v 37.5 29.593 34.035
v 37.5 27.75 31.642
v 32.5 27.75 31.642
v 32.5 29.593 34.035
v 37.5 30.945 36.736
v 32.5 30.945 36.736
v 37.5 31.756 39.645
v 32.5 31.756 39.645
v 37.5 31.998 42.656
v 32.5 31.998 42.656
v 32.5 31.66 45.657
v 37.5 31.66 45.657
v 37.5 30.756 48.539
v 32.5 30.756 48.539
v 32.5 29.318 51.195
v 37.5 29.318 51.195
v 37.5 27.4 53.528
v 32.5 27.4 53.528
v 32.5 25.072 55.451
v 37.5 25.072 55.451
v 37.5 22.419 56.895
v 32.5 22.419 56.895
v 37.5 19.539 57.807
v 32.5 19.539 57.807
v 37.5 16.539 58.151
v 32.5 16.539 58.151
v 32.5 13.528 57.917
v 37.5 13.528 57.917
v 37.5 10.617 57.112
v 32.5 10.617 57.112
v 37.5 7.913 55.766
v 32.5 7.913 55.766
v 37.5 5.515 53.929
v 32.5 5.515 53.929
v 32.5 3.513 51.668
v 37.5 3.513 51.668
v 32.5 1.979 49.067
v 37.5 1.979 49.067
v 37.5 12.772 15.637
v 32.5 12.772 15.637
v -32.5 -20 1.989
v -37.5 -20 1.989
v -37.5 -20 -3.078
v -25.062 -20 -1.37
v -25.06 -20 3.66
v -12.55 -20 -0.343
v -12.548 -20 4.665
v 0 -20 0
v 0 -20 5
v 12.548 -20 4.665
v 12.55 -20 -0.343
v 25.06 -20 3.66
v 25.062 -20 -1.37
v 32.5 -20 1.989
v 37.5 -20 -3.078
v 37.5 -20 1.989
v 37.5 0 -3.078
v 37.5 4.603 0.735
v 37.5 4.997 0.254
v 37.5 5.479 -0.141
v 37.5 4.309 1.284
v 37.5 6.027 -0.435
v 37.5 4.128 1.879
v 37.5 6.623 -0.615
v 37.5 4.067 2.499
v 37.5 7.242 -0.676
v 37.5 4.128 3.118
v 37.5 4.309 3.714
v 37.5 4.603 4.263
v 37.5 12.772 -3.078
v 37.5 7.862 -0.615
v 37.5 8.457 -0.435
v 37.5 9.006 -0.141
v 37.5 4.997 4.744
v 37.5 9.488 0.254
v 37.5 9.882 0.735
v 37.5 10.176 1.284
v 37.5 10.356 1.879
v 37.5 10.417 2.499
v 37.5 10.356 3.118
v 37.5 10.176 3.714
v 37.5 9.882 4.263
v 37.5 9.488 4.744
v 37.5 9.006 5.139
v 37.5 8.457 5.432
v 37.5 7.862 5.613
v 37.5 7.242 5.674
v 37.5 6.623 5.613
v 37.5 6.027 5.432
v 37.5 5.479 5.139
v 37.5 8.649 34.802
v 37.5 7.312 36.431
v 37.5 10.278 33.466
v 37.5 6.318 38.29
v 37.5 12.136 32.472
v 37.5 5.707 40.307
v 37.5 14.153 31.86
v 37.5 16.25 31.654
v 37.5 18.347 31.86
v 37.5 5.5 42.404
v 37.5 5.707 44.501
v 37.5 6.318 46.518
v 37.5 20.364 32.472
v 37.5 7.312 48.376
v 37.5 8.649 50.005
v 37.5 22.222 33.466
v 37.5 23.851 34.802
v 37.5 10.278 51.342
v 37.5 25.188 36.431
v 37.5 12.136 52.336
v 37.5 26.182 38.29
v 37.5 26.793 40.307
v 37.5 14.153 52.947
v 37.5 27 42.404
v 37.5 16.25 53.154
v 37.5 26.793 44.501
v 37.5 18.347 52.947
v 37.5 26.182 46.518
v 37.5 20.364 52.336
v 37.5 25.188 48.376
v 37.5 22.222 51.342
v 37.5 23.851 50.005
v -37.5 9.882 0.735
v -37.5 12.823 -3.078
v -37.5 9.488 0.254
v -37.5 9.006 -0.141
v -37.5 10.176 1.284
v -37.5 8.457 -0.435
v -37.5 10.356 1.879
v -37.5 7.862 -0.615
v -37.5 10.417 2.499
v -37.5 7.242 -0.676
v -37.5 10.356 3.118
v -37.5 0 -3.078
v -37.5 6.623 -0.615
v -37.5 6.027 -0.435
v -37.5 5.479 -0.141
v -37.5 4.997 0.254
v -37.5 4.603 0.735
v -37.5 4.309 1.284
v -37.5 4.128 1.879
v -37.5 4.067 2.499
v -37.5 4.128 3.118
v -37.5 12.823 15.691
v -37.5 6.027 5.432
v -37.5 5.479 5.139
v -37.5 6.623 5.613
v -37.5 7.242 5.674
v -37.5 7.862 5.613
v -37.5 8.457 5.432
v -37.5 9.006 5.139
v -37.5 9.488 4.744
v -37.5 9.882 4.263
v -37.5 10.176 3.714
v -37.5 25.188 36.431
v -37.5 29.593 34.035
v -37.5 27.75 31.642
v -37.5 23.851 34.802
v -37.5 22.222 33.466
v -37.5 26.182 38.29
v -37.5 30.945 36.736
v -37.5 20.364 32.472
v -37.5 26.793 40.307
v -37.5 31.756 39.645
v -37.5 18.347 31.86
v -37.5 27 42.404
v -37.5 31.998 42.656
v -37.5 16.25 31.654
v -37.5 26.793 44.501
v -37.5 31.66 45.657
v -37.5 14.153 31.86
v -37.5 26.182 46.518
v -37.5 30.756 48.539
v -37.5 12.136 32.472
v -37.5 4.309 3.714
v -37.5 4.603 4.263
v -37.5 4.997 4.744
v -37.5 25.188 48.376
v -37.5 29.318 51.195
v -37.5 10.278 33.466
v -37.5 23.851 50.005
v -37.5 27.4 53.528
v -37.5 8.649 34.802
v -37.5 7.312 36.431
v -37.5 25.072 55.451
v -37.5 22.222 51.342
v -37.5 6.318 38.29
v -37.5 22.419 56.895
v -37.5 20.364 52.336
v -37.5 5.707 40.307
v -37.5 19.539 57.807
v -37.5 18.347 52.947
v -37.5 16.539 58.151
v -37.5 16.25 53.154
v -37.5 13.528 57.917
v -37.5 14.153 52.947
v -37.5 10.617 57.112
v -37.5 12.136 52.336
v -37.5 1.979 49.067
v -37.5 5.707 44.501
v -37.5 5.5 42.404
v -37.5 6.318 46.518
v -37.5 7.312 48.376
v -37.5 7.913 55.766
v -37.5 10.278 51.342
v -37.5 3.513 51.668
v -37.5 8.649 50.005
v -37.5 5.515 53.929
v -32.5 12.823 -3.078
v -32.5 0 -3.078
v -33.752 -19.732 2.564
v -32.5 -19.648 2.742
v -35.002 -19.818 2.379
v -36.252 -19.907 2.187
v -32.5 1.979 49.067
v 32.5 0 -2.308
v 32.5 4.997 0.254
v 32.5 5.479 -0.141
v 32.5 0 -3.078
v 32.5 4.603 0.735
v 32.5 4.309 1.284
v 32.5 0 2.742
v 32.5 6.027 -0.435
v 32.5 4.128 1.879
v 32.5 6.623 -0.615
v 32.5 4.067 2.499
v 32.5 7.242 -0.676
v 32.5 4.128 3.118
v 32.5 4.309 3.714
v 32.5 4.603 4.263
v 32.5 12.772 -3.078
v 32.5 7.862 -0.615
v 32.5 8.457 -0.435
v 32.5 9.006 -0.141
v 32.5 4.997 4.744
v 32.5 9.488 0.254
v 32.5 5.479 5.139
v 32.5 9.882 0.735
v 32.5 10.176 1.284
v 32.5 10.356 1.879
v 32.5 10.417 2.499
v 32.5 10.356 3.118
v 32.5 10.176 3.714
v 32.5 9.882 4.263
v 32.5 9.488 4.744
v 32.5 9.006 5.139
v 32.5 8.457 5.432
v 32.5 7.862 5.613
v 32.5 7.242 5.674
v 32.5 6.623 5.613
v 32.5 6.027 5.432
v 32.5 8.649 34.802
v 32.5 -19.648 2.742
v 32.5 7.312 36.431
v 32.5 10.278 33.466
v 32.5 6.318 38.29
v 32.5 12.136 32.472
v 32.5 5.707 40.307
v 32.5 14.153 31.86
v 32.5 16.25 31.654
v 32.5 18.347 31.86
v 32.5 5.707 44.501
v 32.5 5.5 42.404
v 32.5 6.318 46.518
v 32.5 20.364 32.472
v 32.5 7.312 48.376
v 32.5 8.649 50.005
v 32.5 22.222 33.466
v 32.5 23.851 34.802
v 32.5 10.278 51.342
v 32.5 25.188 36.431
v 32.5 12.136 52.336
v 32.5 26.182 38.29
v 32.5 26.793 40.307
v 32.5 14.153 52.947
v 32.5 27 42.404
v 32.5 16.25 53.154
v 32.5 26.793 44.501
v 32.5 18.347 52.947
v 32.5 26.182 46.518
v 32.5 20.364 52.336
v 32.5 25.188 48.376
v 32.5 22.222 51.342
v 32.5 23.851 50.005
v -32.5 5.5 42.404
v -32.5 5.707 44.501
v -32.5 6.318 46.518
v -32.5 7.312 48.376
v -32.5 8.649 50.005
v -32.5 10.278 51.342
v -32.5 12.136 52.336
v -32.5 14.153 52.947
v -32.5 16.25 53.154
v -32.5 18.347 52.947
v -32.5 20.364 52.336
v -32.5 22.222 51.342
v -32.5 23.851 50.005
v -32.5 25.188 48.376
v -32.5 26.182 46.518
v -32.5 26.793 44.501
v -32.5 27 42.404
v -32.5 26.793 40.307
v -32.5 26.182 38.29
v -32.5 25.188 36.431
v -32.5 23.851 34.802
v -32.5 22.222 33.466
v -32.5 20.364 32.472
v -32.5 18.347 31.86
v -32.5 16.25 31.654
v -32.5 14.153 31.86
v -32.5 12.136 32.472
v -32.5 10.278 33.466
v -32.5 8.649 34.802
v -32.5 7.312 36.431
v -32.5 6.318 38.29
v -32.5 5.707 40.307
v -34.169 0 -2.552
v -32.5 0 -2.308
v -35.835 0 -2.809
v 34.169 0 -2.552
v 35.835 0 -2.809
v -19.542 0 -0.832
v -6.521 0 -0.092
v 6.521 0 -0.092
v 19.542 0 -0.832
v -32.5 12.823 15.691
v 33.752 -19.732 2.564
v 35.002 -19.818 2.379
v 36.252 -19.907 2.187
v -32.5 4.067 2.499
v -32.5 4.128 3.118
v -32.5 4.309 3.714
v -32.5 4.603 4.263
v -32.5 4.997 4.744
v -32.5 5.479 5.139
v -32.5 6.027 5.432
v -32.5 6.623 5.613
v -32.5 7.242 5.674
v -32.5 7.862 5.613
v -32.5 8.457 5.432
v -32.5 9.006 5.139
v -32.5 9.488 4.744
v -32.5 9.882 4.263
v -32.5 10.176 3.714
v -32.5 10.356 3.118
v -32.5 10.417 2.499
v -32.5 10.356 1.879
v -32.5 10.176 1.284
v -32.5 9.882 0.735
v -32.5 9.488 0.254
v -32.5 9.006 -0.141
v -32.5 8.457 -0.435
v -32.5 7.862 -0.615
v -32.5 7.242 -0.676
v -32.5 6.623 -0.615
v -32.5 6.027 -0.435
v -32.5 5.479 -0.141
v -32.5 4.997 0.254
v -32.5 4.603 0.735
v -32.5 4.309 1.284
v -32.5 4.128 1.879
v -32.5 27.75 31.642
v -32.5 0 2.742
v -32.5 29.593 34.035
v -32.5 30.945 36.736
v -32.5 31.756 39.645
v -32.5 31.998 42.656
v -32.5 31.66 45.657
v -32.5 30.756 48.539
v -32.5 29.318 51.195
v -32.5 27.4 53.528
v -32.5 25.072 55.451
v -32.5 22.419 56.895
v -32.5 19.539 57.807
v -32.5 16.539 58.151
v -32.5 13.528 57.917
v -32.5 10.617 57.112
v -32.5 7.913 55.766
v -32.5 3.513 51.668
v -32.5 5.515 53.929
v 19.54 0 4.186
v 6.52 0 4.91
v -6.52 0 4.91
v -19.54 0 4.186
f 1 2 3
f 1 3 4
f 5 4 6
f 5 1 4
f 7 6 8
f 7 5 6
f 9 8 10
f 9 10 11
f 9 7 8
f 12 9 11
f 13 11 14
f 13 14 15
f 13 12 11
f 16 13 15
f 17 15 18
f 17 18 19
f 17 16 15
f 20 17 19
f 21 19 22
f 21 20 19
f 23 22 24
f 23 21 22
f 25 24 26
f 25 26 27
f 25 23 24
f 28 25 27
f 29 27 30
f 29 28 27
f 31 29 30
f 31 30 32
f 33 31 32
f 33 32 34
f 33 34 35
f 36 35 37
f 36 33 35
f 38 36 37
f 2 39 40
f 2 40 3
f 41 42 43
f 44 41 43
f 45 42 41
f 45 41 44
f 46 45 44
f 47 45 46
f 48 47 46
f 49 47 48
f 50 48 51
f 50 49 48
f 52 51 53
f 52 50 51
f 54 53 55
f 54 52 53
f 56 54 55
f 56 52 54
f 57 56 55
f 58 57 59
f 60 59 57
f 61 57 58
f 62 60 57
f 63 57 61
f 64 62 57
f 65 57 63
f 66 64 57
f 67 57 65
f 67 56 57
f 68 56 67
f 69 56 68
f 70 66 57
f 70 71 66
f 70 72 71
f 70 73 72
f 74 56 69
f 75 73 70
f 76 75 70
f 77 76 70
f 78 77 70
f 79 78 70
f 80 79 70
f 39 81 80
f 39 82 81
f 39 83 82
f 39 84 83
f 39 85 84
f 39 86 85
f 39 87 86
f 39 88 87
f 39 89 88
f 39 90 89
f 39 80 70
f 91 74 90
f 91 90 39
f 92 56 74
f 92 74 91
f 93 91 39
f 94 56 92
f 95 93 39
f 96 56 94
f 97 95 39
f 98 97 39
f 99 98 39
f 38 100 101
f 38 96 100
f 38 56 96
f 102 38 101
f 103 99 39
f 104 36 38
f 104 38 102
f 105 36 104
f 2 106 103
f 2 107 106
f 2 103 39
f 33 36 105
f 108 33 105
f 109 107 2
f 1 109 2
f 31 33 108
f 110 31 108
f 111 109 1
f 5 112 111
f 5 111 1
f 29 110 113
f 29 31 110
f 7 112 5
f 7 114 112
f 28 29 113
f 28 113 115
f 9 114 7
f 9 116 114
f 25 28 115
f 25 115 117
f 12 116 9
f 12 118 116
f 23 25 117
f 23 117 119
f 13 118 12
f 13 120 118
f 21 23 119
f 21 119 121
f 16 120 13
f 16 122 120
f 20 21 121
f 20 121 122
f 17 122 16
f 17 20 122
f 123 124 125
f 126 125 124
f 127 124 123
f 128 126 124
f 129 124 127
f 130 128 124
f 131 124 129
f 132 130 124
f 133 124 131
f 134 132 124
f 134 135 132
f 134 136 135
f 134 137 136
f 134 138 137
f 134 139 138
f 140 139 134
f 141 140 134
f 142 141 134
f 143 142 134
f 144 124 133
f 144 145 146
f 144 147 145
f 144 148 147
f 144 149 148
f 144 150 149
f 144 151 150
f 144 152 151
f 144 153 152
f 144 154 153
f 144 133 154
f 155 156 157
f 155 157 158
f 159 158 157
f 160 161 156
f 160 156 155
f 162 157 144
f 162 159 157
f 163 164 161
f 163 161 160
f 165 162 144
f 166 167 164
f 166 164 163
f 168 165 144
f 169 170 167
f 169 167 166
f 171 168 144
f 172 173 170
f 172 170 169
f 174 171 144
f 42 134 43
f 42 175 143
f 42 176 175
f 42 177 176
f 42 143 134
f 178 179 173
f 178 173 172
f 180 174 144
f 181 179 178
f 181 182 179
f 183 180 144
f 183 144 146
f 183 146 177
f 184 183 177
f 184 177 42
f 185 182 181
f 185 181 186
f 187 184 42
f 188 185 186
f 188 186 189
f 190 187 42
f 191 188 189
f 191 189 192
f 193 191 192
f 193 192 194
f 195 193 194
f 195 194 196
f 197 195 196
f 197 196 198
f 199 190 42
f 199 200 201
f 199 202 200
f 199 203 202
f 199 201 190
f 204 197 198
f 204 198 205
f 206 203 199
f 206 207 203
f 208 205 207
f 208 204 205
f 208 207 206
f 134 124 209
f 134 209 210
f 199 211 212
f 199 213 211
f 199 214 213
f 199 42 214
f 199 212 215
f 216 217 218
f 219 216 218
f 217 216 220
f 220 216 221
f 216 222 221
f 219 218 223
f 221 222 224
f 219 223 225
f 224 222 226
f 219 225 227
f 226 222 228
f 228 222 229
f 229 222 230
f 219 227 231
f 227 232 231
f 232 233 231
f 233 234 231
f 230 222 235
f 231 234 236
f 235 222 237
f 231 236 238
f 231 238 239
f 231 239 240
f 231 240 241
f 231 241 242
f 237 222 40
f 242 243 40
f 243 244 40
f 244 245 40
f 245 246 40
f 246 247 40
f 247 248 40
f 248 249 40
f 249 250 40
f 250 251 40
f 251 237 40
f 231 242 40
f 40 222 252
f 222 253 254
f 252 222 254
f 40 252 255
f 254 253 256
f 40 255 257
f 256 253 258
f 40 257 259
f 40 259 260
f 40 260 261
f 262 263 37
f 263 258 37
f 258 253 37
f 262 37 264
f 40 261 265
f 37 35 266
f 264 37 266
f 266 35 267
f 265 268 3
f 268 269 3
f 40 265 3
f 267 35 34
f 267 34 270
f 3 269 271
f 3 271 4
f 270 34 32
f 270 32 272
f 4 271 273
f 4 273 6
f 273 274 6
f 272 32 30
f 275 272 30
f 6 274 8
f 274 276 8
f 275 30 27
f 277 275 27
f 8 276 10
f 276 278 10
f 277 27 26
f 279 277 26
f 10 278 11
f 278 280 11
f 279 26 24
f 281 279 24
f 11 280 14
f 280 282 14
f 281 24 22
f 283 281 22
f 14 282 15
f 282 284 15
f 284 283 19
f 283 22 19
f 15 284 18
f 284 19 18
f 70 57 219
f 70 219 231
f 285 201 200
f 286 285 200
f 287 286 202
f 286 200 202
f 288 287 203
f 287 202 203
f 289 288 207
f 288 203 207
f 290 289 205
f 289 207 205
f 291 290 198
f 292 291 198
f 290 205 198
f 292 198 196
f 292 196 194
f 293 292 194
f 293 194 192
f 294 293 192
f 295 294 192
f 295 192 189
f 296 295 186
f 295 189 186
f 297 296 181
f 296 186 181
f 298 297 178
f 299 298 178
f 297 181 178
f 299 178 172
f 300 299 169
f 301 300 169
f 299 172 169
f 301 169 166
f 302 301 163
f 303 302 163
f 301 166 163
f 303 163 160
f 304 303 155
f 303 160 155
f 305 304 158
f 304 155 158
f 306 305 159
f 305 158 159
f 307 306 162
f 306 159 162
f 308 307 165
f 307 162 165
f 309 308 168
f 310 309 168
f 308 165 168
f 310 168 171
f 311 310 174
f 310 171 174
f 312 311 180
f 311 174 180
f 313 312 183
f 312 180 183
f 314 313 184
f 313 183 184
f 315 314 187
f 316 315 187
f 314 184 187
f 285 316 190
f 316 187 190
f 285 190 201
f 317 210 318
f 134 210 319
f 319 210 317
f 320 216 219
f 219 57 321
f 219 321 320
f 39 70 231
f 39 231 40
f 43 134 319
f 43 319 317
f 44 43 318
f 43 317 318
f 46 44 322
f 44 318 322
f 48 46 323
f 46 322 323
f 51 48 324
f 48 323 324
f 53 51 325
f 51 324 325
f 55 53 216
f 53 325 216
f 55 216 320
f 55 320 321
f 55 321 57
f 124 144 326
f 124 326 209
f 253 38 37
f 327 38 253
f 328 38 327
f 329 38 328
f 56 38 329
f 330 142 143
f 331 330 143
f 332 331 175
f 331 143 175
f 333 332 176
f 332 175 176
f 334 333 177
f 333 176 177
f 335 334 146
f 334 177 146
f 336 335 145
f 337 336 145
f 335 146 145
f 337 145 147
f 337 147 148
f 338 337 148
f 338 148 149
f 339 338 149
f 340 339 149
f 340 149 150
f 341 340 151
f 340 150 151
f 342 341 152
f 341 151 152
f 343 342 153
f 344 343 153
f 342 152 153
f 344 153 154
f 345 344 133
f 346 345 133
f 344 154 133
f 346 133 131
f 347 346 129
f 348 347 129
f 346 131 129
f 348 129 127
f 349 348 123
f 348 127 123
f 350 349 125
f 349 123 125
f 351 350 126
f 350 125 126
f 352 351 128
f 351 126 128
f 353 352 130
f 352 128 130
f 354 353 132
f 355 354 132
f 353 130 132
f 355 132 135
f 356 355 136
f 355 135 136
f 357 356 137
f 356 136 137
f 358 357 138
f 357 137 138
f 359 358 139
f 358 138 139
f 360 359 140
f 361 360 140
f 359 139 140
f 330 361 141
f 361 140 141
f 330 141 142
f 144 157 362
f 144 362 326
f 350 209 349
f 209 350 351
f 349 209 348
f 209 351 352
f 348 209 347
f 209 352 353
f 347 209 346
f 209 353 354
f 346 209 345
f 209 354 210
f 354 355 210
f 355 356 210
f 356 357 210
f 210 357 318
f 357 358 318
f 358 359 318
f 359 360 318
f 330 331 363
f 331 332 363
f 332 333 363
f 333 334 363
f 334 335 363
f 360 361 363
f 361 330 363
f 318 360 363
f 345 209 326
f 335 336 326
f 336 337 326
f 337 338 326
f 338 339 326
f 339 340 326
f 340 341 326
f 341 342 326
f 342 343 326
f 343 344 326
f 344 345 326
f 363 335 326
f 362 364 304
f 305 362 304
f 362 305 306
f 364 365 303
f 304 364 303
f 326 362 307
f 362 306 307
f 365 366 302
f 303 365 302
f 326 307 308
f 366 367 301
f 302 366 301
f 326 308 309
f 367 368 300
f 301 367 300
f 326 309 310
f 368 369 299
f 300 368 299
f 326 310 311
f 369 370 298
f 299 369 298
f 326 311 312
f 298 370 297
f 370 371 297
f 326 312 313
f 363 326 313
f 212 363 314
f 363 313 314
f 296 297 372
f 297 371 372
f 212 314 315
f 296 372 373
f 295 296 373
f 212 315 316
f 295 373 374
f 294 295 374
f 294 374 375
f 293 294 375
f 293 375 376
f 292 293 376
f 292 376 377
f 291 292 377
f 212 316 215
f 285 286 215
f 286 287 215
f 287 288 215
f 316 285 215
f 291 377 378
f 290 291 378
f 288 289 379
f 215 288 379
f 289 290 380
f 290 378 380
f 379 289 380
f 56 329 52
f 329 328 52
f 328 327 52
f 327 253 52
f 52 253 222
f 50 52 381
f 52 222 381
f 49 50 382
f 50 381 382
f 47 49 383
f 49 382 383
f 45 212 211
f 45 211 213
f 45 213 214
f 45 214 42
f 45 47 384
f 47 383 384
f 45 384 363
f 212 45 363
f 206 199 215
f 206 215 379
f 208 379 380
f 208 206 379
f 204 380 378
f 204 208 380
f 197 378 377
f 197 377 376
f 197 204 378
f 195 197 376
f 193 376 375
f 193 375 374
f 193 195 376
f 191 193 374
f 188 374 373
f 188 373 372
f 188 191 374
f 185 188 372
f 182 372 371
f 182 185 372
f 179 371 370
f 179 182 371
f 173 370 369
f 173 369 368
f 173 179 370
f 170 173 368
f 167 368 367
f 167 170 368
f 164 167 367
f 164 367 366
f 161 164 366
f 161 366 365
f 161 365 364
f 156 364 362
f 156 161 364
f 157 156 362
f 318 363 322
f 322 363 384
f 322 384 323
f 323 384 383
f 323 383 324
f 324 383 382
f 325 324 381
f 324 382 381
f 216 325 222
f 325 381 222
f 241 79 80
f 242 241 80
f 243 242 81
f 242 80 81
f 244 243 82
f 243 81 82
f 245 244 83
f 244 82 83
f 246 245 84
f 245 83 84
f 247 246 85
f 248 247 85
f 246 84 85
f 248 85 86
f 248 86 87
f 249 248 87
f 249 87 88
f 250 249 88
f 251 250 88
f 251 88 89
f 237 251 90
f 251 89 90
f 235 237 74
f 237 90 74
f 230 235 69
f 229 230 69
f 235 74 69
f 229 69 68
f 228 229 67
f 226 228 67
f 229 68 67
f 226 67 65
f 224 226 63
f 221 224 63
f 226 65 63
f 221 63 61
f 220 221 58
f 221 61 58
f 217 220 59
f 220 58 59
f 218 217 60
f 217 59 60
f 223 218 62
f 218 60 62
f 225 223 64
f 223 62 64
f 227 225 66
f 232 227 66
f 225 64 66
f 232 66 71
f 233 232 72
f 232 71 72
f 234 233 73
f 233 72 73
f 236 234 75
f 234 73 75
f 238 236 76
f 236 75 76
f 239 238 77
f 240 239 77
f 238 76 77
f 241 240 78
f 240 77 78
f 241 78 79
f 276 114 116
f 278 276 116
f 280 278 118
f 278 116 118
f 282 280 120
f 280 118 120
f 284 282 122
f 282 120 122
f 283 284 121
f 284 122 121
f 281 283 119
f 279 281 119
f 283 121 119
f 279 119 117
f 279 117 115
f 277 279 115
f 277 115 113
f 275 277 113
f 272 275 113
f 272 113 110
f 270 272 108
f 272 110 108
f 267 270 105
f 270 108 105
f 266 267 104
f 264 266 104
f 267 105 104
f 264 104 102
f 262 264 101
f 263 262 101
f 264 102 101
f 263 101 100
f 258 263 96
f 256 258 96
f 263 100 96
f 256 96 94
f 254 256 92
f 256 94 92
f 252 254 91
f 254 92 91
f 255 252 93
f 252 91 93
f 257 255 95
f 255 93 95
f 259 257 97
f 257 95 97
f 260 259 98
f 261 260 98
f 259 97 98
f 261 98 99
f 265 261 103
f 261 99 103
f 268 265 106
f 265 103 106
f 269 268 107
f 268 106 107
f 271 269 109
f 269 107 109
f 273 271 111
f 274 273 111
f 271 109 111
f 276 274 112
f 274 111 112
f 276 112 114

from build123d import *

# Parameters (mm, degrees)
F1_DEPTH = 20
F2_R     = 10.75
F3_DEPTH = 5
F4_R     = 10.75
F5_DEPTH = 5
F6_R     = 3.175
F7_DEPTH = 5
F8_R     = 3.175
F9_DEPTH = 5


with BuildPart() as f1:
    # F0 (on Front) → F1 (new body)
    with BuildSketch(Plane.XZ):
        with BuildLine():
            Line((37.5, -3.077656), (37.5, 1.988685))
            ThreePointArc((37.5, 1.988685), (0, 5), (-37.5, 1.988685))
            Line((-37.5, 1.988685), (-37.5, -3.077656))
            ThreePointArc((-37.5, -3.077656), (0, 0), (37.5, -3.077656))
        make_face()
    extrude(amount=F1_DEPTH)

    # F2 (on face) → F3 (join)
    with BuildSketch(Plane.YZ.offset(37.5)):
        with BuildLine():
            Line((0, 1.988685), (27.749921, 31.642143))
            ThreePointArc((27.749921, 31.642143), (25.071711, 55.451453), (1.978662, 49.066537))
            Line((1.978662, 49.066537), (-20, 1.988685))
            Line((-20, 1.988685), (0, 1.988685))
        make_face()
        with Locations((16.250001, 42.403851)):
            Circle(F2_R, mode=Mode.SUBTRACT)
    extrude(amount=-F3_DEPTH)

    # F4 (on face) → F5 (join)
    with BuildSketch(Plane(origin=(-37.5, 0, 0), x_dir=(0, -1, 0), z_dir=(-1, 0, 0))):
        with BuildLine():
            Line((20, 1.988685), (-1.978662, 49.066537))
            ThreePointArc((-1.978662, 49.066537), (-25.071711, 55.451453), (-27.749921, 31.642143))
            Line((-27.749921, 31.642143), (0, 1.988685))
            Line((0, 1.988685), (20, 1.988685))
        make_face()
        with Locations((-16.250001, 42.403851)):
            Circle(F4_R, mode=Mode.SUBTRACT)
    extrude(amount=-F5_DEPTH)

    # F6 (on face) → F7 (join)
    with BuildSketch(Plane.YZ.offset(37.5)):
        Polygon((0, 1.988685), (0, -3.077656), (12.772466, -3.077656), (12.772466, 15.637293), align=None)
        with Locations((7.242475, 2.498732)):
            Circle(F6_R, mode=Mode.SUBTRACT)
    extrude(amount=-F7_DEPTH)

    # F8 (on face) → F9 (join)
    with BuildSketch(Plane(origin=(-37.5, 0, 0), x_dir=(0, -1, 0), z_dir=(-1, 0, 0))):
        Polygon((-12.822957, -3.077656), (0, -3.077656), (0, 1.988685), (-12.822957, 15.691247), align=None)
        with Locations((-7.242475, 2.498732)):
            Circle(F8_R, mode=Mode.SUBTRACT)
    extrude(amount=-F9_DEPTH)


solid = f1.part
